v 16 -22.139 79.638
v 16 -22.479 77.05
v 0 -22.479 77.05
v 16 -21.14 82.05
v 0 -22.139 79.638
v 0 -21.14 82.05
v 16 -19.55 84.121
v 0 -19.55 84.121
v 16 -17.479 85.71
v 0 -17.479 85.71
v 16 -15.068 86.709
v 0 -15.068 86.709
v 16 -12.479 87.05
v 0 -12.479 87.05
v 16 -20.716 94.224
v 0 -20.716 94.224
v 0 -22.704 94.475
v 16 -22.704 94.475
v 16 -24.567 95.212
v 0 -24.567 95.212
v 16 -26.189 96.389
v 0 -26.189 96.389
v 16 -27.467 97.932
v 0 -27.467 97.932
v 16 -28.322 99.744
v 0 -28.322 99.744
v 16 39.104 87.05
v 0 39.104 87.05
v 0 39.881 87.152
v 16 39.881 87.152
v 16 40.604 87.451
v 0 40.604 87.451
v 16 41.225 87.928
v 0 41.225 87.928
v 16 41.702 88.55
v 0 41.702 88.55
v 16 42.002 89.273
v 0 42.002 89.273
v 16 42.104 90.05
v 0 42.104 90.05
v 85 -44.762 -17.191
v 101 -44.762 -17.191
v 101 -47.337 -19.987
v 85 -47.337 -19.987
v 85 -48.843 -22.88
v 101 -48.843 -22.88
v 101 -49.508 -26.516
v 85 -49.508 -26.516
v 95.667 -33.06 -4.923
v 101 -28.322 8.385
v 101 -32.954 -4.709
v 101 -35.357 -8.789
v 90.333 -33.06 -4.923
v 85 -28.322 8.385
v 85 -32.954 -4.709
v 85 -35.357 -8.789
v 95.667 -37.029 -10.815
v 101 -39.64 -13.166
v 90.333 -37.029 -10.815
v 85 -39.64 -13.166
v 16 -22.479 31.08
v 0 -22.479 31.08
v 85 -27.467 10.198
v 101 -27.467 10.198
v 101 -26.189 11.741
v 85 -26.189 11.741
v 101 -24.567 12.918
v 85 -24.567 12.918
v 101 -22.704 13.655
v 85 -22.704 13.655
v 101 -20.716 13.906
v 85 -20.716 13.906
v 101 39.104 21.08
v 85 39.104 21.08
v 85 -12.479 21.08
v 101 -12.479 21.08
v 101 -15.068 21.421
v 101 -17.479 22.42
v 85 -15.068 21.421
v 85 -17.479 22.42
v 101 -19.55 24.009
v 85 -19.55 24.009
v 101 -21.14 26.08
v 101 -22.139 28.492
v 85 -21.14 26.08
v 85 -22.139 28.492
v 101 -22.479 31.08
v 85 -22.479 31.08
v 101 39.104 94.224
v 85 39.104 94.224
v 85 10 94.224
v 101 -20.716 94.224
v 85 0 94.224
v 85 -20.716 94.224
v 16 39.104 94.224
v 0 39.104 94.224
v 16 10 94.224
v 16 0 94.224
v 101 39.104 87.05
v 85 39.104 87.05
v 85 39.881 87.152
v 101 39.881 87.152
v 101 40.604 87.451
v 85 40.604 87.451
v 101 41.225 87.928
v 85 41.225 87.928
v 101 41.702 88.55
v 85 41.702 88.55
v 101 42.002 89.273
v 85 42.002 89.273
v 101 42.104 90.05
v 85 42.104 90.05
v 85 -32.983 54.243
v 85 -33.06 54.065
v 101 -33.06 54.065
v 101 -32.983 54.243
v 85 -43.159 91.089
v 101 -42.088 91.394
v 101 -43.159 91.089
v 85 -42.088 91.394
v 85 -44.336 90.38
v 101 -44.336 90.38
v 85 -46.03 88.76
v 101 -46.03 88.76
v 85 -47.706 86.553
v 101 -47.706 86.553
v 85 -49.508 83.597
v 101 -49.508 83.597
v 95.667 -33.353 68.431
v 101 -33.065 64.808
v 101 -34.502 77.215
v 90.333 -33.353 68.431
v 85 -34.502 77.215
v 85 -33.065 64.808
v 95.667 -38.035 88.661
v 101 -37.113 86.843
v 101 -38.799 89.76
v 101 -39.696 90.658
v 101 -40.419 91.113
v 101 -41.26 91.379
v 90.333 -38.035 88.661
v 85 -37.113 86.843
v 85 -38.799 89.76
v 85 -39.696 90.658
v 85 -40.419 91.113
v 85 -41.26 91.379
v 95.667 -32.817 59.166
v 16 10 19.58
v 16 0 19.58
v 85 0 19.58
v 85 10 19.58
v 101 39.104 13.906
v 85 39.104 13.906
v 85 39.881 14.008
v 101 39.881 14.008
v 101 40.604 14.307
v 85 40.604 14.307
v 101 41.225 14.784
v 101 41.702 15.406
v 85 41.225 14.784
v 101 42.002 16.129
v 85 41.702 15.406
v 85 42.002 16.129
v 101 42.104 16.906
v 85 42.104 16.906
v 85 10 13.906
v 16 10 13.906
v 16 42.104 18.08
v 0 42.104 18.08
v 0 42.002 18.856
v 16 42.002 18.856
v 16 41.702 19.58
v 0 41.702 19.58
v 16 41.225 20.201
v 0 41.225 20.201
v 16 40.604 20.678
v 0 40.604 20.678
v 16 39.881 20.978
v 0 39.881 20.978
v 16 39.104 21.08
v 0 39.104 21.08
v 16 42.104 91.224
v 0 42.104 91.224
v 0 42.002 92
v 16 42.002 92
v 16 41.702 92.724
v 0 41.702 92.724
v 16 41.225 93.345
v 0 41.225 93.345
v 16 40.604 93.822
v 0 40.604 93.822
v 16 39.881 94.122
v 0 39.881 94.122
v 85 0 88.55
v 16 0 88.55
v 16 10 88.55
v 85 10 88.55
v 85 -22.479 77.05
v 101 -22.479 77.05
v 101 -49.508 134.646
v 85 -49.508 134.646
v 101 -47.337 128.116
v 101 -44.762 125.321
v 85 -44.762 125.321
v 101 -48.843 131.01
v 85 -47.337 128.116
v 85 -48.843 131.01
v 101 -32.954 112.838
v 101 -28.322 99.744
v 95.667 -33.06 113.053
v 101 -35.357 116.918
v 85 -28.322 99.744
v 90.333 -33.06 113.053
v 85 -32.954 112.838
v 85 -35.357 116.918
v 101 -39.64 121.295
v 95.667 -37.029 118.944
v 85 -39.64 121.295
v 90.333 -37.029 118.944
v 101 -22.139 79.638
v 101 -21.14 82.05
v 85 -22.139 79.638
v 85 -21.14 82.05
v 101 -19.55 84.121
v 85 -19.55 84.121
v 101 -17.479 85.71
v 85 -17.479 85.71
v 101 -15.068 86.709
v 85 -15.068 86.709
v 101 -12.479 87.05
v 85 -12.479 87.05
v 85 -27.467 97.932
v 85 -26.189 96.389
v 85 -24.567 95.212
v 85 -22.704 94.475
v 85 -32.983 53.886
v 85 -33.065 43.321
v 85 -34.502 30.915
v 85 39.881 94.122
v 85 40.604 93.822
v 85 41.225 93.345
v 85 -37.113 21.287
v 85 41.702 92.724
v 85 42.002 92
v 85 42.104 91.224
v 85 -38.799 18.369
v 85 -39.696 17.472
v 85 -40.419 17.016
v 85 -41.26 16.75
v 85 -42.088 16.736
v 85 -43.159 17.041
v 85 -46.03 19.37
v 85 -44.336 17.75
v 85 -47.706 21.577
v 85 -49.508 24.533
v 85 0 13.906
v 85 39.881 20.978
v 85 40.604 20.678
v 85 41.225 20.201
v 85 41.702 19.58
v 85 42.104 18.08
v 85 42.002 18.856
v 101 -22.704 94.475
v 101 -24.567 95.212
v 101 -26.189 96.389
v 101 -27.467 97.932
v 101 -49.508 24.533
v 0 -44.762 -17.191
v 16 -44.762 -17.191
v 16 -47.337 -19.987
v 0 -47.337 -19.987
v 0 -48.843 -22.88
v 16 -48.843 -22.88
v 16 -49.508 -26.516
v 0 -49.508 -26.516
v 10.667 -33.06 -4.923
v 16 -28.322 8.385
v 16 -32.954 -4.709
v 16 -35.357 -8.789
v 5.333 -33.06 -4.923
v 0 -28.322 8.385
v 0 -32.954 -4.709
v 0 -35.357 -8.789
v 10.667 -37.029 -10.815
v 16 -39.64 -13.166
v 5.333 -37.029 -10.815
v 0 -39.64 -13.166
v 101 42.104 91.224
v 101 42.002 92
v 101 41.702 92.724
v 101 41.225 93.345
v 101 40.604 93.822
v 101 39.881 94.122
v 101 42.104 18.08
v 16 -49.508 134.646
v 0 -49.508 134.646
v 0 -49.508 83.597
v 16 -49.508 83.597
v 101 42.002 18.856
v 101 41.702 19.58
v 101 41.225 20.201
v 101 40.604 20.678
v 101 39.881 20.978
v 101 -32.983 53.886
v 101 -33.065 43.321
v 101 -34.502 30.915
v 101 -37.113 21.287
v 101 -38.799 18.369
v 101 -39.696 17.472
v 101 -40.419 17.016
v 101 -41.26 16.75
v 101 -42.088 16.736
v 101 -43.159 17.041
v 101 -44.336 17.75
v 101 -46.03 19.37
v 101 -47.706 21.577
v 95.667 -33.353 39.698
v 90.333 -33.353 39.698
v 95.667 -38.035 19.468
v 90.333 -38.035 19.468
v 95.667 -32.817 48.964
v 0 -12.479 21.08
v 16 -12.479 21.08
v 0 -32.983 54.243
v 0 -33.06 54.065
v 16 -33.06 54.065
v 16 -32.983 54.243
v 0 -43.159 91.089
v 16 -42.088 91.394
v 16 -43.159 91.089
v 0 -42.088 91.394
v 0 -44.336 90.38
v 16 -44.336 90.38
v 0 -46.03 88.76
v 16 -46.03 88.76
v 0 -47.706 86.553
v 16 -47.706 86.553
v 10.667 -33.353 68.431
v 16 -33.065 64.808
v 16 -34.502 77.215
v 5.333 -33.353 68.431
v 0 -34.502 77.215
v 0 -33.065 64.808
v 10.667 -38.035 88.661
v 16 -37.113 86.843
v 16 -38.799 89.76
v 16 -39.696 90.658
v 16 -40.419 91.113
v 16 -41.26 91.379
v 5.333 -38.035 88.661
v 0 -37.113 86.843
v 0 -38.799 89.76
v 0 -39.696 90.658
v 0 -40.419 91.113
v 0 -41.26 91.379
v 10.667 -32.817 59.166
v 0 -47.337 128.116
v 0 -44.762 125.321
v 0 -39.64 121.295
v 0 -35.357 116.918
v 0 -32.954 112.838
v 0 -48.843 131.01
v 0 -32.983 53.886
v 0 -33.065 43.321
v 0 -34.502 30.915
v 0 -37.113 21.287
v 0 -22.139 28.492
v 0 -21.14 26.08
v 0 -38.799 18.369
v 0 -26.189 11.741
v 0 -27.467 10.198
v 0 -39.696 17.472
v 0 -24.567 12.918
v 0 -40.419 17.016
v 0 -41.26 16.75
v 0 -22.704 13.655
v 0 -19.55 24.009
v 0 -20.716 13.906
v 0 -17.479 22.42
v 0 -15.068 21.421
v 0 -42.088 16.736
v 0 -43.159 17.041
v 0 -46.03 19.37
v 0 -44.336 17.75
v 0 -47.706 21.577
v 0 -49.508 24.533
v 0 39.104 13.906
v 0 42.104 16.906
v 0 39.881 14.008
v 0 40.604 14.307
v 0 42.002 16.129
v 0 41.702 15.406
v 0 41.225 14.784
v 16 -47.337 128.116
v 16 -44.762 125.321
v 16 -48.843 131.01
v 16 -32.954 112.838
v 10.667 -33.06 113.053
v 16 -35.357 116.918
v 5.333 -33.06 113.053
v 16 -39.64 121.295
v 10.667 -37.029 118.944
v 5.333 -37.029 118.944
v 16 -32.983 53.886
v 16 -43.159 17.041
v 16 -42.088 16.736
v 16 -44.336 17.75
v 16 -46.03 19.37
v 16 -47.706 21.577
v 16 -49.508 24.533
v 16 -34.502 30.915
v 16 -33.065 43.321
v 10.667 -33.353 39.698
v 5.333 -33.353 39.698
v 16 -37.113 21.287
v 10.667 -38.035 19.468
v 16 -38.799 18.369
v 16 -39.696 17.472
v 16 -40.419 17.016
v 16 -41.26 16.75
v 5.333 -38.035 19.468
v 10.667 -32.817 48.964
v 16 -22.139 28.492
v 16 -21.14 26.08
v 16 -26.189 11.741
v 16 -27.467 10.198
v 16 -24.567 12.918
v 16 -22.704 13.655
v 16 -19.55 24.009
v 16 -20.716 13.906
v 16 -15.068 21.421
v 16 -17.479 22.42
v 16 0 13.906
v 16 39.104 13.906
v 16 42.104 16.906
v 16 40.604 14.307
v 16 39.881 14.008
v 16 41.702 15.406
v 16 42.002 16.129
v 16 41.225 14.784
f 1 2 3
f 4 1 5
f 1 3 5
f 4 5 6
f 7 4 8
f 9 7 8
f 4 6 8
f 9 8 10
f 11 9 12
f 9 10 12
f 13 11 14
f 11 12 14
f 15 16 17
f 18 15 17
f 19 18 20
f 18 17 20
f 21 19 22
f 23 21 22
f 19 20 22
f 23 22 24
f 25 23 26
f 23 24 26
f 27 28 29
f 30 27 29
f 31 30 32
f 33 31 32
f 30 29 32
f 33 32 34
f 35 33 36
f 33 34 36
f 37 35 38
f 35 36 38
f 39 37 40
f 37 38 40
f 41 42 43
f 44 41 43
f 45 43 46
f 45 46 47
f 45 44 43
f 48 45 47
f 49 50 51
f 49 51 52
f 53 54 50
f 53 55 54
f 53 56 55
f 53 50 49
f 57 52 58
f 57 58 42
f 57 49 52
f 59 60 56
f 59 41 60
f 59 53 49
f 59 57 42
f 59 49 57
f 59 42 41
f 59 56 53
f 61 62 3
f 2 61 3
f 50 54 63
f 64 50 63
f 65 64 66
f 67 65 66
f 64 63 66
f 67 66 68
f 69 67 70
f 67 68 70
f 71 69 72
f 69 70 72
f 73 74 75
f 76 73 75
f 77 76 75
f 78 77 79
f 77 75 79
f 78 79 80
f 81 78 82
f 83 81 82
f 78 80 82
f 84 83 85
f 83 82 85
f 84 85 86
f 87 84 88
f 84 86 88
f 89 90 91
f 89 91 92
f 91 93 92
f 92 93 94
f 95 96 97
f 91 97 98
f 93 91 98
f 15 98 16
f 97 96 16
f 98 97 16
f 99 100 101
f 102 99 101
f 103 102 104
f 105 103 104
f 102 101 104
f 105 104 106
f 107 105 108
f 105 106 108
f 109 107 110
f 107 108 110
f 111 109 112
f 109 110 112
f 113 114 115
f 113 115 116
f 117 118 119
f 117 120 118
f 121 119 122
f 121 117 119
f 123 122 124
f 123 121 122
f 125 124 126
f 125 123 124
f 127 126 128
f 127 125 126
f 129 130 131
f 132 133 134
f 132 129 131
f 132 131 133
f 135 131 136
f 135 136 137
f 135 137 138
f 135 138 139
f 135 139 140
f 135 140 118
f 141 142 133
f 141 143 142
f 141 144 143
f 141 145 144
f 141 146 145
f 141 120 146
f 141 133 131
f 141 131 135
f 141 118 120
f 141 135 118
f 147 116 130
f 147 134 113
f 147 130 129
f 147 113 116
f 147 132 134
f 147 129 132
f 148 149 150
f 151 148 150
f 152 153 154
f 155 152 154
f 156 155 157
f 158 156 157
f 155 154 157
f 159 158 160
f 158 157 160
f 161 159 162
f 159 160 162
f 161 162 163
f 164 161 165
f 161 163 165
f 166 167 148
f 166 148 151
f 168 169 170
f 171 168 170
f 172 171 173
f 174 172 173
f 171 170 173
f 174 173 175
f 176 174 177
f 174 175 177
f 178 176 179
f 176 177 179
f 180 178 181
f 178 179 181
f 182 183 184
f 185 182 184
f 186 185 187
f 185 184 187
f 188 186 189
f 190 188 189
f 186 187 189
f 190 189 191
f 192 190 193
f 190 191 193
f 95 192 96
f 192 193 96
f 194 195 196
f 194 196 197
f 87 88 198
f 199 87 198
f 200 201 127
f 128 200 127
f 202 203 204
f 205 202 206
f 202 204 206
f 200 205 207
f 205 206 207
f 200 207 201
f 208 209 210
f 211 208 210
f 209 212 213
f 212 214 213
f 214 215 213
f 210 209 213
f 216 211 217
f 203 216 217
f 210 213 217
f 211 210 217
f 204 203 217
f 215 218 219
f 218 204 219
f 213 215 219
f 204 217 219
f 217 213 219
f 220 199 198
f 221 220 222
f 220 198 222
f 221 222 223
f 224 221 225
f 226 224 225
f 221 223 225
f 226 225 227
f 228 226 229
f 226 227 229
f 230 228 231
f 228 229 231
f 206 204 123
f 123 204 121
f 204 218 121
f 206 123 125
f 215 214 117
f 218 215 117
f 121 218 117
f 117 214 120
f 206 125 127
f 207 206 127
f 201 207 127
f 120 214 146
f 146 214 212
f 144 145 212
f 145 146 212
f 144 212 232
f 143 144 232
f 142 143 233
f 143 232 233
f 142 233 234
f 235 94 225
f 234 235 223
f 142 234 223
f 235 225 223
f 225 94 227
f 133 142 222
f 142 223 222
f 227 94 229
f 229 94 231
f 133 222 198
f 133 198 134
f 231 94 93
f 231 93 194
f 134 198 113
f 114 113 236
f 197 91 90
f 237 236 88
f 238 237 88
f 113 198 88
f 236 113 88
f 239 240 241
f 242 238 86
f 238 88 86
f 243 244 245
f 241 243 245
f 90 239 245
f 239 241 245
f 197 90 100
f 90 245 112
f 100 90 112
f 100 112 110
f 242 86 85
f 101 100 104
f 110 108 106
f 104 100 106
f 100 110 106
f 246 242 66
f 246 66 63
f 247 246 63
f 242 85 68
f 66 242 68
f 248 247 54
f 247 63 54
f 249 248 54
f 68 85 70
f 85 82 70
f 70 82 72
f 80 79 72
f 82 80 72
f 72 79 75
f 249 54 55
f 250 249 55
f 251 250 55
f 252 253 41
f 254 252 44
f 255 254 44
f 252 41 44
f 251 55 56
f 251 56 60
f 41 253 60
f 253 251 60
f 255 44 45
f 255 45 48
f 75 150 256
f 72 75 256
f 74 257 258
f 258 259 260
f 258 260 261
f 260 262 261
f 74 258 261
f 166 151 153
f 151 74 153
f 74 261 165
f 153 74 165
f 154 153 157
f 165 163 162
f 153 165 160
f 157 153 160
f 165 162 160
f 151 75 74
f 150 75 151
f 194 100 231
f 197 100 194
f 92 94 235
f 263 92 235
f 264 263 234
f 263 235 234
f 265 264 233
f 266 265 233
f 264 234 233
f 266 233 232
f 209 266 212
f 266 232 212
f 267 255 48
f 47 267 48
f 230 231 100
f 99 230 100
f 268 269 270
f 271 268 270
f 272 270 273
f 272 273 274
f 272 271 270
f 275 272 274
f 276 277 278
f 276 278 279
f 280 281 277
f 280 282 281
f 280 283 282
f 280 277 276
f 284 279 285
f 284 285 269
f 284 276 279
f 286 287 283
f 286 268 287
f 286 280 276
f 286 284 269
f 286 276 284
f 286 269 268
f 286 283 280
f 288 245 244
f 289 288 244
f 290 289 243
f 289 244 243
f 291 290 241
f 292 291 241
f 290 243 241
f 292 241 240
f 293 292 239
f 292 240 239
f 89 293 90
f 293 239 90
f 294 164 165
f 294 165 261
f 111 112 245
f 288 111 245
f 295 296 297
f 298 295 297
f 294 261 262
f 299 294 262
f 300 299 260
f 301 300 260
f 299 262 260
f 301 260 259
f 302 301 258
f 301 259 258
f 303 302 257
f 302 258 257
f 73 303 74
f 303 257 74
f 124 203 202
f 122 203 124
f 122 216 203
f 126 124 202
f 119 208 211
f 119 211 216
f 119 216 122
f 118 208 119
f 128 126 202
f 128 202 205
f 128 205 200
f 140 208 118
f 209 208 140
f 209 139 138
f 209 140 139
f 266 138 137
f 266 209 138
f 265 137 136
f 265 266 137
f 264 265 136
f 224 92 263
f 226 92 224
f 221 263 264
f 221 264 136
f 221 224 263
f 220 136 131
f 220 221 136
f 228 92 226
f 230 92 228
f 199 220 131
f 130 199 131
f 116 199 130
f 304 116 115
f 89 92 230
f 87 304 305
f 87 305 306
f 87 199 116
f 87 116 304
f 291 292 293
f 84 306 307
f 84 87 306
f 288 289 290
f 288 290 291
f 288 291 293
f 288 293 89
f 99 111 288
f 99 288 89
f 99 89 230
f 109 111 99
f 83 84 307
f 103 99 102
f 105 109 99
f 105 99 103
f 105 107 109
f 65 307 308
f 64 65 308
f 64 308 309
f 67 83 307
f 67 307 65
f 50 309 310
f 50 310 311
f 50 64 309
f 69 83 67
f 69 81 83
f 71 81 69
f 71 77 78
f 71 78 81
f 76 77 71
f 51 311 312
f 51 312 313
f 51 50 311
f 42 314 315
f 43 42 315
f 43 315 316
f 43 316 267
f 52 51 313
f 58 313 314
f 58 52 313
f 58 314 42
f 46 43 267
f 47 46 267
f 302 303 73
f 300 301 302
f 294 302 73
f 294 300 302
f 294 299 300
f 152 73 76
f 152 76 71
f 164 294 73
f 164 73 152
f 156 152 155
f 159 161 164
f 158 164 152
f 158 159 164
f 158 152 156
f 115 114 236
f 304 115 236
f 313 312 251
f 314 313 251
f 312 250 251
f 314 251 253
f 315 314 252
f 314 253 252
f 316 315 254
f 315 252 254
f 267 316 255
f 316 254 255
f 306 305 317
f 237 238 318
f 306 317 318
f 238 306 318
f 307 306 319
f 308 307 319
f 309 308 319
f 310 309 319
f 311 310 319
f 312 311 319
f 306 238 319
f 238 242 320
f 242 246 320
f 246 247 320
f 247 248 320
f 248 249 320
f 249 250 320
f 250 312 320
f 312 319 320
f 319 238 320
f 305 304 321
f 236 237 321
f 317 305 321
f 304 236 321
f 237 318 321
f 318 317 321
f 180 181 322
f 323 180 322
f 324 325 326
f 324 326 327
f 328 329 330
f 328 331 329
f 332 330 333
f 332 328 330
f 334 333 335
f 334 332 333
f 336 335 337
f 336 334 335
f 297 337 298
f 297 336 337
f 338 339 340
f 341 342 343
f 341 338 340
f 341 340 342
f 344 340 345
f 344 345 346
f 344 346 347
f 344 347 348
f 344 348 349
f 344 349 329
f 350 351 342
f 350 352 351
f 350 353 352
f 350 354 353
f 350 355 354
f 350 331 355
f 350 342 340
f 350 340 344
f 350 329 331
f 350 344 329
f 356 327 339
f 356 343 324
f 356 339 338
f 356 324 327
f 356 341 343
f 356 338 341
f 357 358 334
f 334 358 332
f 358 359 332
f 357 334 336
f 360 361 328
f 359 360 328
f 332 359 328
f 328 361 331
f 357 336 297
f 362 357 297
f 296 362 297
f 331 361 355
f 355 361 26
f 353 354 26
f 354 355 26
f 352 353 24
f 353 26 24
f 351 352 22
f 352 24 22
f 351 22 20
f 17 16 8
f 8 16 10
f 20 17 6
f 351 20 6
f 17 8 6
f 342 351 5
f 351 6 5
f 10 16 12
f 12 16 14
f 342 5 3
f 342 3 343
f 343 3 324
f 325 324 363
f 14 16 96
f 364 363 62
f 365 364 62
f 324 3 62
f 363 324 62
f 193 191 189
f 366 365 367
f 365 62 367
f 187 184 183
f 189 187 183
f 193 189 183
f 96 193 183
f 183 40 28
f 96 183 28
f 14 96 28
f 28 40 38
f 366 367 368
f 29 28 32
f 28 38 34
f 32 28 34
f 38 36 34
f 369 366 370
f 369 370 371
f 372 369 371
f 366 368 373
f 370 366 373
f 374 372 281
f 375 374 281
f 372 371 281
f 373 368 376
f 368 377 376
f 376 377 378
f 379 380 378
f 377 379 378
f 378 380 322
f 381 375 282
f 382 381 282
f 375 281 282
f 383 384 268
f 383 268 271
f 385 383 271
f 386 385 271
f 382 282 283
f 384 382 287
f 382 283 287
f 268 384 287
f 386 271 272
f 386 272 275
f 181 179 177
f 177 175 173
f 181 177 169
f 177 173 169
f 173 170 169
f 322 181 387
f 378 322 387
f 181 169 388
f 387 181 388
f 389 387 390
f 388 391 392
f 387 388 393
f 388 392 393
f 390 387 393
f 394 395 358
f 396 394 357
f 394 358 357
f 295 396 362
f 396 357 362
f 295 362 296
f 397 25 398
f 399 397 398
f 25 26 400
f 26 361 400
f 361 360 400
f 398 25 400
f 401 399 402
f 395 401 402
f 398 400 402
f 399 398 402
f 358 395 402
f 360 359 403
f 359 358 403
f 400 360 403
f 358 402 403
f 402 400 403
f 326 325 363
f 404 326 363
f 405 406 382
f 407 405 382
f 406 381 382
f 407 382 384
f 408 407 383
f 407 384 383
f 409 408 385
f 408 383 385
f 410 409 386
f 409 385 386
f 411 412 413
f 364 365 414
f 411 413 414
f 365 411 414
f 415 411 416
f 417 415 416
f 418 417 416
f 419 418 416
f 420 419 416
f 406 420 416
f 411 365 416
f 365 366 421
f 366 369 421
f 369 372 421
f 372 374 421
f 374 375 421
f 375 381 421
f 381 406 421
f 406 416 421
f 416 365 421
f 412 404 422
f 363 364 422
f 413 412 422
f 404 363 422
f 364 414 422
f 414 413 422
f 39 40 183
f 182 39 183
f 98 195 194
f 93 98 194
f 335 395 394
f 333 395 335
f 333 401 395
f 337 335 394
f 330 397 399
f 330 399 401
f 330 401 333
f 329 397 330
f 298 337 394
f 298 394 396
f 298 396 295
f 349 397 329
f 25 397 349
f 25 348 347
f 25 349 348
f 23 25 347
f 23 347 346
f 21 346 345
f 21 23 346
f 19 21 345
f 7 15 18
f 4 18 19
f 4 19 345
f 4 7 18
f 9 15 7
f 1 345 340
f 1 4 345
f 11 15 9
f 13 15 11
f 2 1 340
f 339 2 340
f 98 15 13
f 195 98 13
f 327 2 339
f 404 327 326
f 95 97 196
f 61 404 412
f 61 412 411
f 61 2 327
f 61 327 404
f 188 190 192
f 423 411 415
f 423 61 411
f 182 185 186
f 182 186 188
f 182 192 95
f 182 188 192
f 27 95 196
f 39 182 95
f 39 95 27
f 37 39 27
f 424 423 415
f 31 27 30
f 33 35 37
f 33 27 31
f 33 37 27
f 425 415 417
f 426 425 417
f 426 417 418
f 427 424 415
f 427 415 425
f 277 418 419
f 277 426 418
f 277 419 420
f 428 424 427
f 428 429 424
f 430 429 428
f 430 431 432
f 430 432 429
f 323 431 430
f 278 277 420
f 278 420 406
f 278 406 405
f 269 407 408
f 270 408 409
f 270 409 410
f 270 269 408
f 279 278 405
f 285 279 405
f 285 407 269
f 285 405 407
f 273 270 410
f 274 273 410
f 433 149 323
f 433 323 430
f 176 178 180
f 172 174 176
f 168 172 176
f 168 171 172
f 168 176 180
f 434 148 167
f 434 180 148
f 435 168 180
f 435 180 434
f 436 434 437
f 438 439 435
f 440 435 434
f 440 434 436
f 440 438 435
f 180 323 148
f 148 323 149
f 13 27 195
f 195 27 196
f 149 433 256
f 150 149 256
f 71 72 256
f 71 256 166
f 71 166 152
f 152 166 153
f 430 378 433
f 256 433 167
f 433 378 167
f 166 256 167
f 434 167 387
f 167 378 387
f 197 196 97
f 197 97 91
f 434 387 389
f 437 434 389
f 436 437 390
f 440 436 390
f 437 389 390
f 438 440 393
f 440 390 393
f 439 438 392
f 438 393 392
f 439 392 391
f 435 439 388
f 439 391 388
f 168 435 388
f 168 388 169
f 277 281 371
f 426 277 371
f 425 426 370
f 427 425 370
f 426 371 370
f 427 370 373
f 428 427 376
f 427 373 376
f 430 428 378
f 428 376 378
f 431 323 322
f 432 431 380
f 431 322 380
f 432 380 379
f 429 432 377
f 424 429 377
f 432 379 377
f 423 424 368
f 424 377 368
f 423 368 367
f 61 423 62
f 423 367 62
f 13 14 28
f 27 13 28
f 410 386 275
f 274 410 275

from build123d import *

# Parameters (mm, degrees)
EXTRUDE_1_DEPTH = 16
SKETCH_2_W      = 69
SKETCH_2_H      = 5.674471655
EXTRUDE_2_DEPTH = 10


with BuildPart() as part:
    # 草图1 → 凸台-拉伸1 (new body)
    with BuildSketch(Plane(origin=(0, 0, 0), x_dir=(0, 0, -1), z_dir=(1, 0, 0))):
        with BuildLine():
            Line((-90.049538089, 42.104167983), (-91.224009744, 42.104167983))
            ThreePointArc((-91.224009744, 42.104167983), (-93.345330087, 41.225488326), (-94.224009744, 39.104167983))
            Line((-94.224009744, 39.104167983), (-94.224009744, -20.716289887))
            ThreePointArc((-94.224009744, -20.716289887), (-95.749462998, -25.415251948), (-99.744070854, -28.322202266))
            add(Edge.make_bspline(
                [(-99.744070854, -28.322202266), (-104.134038199, -29.753569103), (-111.139855432, -31.558791211), (-123.096893998, -39.107622001), (-126.096856362, -49.163607245), (-134.645731206, -49.507715511)],
                knots=[0.130050002, 0.130050002, 0.130050002, 0.130050002, 0.418291245, 0.563236081, 0.980272749, 0.980272749, 0.980272749, 0.980272749], degree=3))
            Line((-134.645731206, -49.507715511), (-83.597035684, -49.507715511))
            add(Edge.make_bspline(
                [(-54.064775511, -33.059564163), (-55.113380914, -31.957231859), (-111.694163527, -33.841083074), (-83.597035684, -49.507715511)],
                knots=[0, 0, 0, 0, 1, 1, 1, 1], degree=3))
            add(Edge.make_bspline(
                [(-54.064775511, -33.059564163), (-53.016170109, -31.957231859), (3.564612504, -33.841083074), (-24.532515339, -49.507715511)],
                knots=[0, 0, 0, 0, 1, 1, 1, 1], degree=3))
            Line((-24.532515339, -49.507715511), (26.516180183, -49.507715511))
            add(Edge.make_bspline(
                [(-8.385480169, -28.322202266), (-3.995512823, -29.753569103), (3.010304409, -31.558791211), (14.967342975, -39.107622001), (17.967305339, -49.163607245), (26.516180183, -49.507715511)],
                knots=[0.130050002, 0.130050002, 0.130050002, 0.130050002, 0.418291245, 0.563236081, 0.980272749, 0.980272749, 0.980272749, 0.980272749], degree=3))
            ThreePointArc((-8.385480169, -28.322202266), (-12.380088025, -25.415251948), (-13.905541279, -20.716289887))
            Line((-13.905541279, -20.716289887), (-13.905541279, 39.104167983))
            ThreePointArc((-13.905541279, 39.104167983), (-14.784220936, 41.225488326), (-16.905541279, 42.104167983))
            Line((-16.905541279, 42.104167983), (-18.080012934, 42.104167983))
            ThreePointArc((-18.080012934, 42.104167983), (-20.201333278, 41.225488326), (-21.080012934, 39.104167983))
            Line((-21.080012934, 39.104167983), (-21.080012934, -12.479355565))
            ThreePointArc((-21.080012934, -12.479355565), (-24.008945122, -19.550423377), (-31.080012934, -22.479355565))
            Line((-31.080012934, -22.479355565), (-44.127966284, -22.479355565))
            Line((-44.127966284, -22.479355565), (-54.064775511, -22.479355565))
            Line((-54.064775511, -22.479355565), (-64.001584739, -22.479355565))
            Line((-64.001584739, -22.479355565), (-77.049538089, -22.479355565))
            ThreePointArc((-77.049538089, -22.479355565), (-84.120605901, -19.550423377), (-87.049538089, -12.479355565))
            Line((-87.049538089, -12.479355565), (-87.049538089, 39.104167983))
            ThreePointArc((-87.049538089, 39.104167983), (-87.928217745, 41.225488326), (-90.049538089, 42.104167983))
        make_face()
    extrude(amount=EXTRUDE_1_DEPTH)


with BuildPart() as body_2:
    # Move Body 1: copy of part
    add(part.part.moved(Location((85, 0, 0))))


with BuildPart() as part_1:
    add(part.part)

    add(body_2.part)  # 凸台-拉伸2 merges body 2
    # 草图2 → 凸台-拉伸2 (add)
    with BuildSketch(Plane(origin=(0, 0, 0), x_dir=(1, 0, 0), z_dir=(0, 1, 0))):
        with Locations((50.5, -91.386773917)):
            Rectangle(SKETCH_2_W, SKETCH_2_H)
        with Locations((50.5, -16.742777107)):
            Rectangle(SKETCH_2_W, SKETCH_2_H)
    extrude(amount=EXTRUDE_2_DEPTH)


solid = part_1.part
